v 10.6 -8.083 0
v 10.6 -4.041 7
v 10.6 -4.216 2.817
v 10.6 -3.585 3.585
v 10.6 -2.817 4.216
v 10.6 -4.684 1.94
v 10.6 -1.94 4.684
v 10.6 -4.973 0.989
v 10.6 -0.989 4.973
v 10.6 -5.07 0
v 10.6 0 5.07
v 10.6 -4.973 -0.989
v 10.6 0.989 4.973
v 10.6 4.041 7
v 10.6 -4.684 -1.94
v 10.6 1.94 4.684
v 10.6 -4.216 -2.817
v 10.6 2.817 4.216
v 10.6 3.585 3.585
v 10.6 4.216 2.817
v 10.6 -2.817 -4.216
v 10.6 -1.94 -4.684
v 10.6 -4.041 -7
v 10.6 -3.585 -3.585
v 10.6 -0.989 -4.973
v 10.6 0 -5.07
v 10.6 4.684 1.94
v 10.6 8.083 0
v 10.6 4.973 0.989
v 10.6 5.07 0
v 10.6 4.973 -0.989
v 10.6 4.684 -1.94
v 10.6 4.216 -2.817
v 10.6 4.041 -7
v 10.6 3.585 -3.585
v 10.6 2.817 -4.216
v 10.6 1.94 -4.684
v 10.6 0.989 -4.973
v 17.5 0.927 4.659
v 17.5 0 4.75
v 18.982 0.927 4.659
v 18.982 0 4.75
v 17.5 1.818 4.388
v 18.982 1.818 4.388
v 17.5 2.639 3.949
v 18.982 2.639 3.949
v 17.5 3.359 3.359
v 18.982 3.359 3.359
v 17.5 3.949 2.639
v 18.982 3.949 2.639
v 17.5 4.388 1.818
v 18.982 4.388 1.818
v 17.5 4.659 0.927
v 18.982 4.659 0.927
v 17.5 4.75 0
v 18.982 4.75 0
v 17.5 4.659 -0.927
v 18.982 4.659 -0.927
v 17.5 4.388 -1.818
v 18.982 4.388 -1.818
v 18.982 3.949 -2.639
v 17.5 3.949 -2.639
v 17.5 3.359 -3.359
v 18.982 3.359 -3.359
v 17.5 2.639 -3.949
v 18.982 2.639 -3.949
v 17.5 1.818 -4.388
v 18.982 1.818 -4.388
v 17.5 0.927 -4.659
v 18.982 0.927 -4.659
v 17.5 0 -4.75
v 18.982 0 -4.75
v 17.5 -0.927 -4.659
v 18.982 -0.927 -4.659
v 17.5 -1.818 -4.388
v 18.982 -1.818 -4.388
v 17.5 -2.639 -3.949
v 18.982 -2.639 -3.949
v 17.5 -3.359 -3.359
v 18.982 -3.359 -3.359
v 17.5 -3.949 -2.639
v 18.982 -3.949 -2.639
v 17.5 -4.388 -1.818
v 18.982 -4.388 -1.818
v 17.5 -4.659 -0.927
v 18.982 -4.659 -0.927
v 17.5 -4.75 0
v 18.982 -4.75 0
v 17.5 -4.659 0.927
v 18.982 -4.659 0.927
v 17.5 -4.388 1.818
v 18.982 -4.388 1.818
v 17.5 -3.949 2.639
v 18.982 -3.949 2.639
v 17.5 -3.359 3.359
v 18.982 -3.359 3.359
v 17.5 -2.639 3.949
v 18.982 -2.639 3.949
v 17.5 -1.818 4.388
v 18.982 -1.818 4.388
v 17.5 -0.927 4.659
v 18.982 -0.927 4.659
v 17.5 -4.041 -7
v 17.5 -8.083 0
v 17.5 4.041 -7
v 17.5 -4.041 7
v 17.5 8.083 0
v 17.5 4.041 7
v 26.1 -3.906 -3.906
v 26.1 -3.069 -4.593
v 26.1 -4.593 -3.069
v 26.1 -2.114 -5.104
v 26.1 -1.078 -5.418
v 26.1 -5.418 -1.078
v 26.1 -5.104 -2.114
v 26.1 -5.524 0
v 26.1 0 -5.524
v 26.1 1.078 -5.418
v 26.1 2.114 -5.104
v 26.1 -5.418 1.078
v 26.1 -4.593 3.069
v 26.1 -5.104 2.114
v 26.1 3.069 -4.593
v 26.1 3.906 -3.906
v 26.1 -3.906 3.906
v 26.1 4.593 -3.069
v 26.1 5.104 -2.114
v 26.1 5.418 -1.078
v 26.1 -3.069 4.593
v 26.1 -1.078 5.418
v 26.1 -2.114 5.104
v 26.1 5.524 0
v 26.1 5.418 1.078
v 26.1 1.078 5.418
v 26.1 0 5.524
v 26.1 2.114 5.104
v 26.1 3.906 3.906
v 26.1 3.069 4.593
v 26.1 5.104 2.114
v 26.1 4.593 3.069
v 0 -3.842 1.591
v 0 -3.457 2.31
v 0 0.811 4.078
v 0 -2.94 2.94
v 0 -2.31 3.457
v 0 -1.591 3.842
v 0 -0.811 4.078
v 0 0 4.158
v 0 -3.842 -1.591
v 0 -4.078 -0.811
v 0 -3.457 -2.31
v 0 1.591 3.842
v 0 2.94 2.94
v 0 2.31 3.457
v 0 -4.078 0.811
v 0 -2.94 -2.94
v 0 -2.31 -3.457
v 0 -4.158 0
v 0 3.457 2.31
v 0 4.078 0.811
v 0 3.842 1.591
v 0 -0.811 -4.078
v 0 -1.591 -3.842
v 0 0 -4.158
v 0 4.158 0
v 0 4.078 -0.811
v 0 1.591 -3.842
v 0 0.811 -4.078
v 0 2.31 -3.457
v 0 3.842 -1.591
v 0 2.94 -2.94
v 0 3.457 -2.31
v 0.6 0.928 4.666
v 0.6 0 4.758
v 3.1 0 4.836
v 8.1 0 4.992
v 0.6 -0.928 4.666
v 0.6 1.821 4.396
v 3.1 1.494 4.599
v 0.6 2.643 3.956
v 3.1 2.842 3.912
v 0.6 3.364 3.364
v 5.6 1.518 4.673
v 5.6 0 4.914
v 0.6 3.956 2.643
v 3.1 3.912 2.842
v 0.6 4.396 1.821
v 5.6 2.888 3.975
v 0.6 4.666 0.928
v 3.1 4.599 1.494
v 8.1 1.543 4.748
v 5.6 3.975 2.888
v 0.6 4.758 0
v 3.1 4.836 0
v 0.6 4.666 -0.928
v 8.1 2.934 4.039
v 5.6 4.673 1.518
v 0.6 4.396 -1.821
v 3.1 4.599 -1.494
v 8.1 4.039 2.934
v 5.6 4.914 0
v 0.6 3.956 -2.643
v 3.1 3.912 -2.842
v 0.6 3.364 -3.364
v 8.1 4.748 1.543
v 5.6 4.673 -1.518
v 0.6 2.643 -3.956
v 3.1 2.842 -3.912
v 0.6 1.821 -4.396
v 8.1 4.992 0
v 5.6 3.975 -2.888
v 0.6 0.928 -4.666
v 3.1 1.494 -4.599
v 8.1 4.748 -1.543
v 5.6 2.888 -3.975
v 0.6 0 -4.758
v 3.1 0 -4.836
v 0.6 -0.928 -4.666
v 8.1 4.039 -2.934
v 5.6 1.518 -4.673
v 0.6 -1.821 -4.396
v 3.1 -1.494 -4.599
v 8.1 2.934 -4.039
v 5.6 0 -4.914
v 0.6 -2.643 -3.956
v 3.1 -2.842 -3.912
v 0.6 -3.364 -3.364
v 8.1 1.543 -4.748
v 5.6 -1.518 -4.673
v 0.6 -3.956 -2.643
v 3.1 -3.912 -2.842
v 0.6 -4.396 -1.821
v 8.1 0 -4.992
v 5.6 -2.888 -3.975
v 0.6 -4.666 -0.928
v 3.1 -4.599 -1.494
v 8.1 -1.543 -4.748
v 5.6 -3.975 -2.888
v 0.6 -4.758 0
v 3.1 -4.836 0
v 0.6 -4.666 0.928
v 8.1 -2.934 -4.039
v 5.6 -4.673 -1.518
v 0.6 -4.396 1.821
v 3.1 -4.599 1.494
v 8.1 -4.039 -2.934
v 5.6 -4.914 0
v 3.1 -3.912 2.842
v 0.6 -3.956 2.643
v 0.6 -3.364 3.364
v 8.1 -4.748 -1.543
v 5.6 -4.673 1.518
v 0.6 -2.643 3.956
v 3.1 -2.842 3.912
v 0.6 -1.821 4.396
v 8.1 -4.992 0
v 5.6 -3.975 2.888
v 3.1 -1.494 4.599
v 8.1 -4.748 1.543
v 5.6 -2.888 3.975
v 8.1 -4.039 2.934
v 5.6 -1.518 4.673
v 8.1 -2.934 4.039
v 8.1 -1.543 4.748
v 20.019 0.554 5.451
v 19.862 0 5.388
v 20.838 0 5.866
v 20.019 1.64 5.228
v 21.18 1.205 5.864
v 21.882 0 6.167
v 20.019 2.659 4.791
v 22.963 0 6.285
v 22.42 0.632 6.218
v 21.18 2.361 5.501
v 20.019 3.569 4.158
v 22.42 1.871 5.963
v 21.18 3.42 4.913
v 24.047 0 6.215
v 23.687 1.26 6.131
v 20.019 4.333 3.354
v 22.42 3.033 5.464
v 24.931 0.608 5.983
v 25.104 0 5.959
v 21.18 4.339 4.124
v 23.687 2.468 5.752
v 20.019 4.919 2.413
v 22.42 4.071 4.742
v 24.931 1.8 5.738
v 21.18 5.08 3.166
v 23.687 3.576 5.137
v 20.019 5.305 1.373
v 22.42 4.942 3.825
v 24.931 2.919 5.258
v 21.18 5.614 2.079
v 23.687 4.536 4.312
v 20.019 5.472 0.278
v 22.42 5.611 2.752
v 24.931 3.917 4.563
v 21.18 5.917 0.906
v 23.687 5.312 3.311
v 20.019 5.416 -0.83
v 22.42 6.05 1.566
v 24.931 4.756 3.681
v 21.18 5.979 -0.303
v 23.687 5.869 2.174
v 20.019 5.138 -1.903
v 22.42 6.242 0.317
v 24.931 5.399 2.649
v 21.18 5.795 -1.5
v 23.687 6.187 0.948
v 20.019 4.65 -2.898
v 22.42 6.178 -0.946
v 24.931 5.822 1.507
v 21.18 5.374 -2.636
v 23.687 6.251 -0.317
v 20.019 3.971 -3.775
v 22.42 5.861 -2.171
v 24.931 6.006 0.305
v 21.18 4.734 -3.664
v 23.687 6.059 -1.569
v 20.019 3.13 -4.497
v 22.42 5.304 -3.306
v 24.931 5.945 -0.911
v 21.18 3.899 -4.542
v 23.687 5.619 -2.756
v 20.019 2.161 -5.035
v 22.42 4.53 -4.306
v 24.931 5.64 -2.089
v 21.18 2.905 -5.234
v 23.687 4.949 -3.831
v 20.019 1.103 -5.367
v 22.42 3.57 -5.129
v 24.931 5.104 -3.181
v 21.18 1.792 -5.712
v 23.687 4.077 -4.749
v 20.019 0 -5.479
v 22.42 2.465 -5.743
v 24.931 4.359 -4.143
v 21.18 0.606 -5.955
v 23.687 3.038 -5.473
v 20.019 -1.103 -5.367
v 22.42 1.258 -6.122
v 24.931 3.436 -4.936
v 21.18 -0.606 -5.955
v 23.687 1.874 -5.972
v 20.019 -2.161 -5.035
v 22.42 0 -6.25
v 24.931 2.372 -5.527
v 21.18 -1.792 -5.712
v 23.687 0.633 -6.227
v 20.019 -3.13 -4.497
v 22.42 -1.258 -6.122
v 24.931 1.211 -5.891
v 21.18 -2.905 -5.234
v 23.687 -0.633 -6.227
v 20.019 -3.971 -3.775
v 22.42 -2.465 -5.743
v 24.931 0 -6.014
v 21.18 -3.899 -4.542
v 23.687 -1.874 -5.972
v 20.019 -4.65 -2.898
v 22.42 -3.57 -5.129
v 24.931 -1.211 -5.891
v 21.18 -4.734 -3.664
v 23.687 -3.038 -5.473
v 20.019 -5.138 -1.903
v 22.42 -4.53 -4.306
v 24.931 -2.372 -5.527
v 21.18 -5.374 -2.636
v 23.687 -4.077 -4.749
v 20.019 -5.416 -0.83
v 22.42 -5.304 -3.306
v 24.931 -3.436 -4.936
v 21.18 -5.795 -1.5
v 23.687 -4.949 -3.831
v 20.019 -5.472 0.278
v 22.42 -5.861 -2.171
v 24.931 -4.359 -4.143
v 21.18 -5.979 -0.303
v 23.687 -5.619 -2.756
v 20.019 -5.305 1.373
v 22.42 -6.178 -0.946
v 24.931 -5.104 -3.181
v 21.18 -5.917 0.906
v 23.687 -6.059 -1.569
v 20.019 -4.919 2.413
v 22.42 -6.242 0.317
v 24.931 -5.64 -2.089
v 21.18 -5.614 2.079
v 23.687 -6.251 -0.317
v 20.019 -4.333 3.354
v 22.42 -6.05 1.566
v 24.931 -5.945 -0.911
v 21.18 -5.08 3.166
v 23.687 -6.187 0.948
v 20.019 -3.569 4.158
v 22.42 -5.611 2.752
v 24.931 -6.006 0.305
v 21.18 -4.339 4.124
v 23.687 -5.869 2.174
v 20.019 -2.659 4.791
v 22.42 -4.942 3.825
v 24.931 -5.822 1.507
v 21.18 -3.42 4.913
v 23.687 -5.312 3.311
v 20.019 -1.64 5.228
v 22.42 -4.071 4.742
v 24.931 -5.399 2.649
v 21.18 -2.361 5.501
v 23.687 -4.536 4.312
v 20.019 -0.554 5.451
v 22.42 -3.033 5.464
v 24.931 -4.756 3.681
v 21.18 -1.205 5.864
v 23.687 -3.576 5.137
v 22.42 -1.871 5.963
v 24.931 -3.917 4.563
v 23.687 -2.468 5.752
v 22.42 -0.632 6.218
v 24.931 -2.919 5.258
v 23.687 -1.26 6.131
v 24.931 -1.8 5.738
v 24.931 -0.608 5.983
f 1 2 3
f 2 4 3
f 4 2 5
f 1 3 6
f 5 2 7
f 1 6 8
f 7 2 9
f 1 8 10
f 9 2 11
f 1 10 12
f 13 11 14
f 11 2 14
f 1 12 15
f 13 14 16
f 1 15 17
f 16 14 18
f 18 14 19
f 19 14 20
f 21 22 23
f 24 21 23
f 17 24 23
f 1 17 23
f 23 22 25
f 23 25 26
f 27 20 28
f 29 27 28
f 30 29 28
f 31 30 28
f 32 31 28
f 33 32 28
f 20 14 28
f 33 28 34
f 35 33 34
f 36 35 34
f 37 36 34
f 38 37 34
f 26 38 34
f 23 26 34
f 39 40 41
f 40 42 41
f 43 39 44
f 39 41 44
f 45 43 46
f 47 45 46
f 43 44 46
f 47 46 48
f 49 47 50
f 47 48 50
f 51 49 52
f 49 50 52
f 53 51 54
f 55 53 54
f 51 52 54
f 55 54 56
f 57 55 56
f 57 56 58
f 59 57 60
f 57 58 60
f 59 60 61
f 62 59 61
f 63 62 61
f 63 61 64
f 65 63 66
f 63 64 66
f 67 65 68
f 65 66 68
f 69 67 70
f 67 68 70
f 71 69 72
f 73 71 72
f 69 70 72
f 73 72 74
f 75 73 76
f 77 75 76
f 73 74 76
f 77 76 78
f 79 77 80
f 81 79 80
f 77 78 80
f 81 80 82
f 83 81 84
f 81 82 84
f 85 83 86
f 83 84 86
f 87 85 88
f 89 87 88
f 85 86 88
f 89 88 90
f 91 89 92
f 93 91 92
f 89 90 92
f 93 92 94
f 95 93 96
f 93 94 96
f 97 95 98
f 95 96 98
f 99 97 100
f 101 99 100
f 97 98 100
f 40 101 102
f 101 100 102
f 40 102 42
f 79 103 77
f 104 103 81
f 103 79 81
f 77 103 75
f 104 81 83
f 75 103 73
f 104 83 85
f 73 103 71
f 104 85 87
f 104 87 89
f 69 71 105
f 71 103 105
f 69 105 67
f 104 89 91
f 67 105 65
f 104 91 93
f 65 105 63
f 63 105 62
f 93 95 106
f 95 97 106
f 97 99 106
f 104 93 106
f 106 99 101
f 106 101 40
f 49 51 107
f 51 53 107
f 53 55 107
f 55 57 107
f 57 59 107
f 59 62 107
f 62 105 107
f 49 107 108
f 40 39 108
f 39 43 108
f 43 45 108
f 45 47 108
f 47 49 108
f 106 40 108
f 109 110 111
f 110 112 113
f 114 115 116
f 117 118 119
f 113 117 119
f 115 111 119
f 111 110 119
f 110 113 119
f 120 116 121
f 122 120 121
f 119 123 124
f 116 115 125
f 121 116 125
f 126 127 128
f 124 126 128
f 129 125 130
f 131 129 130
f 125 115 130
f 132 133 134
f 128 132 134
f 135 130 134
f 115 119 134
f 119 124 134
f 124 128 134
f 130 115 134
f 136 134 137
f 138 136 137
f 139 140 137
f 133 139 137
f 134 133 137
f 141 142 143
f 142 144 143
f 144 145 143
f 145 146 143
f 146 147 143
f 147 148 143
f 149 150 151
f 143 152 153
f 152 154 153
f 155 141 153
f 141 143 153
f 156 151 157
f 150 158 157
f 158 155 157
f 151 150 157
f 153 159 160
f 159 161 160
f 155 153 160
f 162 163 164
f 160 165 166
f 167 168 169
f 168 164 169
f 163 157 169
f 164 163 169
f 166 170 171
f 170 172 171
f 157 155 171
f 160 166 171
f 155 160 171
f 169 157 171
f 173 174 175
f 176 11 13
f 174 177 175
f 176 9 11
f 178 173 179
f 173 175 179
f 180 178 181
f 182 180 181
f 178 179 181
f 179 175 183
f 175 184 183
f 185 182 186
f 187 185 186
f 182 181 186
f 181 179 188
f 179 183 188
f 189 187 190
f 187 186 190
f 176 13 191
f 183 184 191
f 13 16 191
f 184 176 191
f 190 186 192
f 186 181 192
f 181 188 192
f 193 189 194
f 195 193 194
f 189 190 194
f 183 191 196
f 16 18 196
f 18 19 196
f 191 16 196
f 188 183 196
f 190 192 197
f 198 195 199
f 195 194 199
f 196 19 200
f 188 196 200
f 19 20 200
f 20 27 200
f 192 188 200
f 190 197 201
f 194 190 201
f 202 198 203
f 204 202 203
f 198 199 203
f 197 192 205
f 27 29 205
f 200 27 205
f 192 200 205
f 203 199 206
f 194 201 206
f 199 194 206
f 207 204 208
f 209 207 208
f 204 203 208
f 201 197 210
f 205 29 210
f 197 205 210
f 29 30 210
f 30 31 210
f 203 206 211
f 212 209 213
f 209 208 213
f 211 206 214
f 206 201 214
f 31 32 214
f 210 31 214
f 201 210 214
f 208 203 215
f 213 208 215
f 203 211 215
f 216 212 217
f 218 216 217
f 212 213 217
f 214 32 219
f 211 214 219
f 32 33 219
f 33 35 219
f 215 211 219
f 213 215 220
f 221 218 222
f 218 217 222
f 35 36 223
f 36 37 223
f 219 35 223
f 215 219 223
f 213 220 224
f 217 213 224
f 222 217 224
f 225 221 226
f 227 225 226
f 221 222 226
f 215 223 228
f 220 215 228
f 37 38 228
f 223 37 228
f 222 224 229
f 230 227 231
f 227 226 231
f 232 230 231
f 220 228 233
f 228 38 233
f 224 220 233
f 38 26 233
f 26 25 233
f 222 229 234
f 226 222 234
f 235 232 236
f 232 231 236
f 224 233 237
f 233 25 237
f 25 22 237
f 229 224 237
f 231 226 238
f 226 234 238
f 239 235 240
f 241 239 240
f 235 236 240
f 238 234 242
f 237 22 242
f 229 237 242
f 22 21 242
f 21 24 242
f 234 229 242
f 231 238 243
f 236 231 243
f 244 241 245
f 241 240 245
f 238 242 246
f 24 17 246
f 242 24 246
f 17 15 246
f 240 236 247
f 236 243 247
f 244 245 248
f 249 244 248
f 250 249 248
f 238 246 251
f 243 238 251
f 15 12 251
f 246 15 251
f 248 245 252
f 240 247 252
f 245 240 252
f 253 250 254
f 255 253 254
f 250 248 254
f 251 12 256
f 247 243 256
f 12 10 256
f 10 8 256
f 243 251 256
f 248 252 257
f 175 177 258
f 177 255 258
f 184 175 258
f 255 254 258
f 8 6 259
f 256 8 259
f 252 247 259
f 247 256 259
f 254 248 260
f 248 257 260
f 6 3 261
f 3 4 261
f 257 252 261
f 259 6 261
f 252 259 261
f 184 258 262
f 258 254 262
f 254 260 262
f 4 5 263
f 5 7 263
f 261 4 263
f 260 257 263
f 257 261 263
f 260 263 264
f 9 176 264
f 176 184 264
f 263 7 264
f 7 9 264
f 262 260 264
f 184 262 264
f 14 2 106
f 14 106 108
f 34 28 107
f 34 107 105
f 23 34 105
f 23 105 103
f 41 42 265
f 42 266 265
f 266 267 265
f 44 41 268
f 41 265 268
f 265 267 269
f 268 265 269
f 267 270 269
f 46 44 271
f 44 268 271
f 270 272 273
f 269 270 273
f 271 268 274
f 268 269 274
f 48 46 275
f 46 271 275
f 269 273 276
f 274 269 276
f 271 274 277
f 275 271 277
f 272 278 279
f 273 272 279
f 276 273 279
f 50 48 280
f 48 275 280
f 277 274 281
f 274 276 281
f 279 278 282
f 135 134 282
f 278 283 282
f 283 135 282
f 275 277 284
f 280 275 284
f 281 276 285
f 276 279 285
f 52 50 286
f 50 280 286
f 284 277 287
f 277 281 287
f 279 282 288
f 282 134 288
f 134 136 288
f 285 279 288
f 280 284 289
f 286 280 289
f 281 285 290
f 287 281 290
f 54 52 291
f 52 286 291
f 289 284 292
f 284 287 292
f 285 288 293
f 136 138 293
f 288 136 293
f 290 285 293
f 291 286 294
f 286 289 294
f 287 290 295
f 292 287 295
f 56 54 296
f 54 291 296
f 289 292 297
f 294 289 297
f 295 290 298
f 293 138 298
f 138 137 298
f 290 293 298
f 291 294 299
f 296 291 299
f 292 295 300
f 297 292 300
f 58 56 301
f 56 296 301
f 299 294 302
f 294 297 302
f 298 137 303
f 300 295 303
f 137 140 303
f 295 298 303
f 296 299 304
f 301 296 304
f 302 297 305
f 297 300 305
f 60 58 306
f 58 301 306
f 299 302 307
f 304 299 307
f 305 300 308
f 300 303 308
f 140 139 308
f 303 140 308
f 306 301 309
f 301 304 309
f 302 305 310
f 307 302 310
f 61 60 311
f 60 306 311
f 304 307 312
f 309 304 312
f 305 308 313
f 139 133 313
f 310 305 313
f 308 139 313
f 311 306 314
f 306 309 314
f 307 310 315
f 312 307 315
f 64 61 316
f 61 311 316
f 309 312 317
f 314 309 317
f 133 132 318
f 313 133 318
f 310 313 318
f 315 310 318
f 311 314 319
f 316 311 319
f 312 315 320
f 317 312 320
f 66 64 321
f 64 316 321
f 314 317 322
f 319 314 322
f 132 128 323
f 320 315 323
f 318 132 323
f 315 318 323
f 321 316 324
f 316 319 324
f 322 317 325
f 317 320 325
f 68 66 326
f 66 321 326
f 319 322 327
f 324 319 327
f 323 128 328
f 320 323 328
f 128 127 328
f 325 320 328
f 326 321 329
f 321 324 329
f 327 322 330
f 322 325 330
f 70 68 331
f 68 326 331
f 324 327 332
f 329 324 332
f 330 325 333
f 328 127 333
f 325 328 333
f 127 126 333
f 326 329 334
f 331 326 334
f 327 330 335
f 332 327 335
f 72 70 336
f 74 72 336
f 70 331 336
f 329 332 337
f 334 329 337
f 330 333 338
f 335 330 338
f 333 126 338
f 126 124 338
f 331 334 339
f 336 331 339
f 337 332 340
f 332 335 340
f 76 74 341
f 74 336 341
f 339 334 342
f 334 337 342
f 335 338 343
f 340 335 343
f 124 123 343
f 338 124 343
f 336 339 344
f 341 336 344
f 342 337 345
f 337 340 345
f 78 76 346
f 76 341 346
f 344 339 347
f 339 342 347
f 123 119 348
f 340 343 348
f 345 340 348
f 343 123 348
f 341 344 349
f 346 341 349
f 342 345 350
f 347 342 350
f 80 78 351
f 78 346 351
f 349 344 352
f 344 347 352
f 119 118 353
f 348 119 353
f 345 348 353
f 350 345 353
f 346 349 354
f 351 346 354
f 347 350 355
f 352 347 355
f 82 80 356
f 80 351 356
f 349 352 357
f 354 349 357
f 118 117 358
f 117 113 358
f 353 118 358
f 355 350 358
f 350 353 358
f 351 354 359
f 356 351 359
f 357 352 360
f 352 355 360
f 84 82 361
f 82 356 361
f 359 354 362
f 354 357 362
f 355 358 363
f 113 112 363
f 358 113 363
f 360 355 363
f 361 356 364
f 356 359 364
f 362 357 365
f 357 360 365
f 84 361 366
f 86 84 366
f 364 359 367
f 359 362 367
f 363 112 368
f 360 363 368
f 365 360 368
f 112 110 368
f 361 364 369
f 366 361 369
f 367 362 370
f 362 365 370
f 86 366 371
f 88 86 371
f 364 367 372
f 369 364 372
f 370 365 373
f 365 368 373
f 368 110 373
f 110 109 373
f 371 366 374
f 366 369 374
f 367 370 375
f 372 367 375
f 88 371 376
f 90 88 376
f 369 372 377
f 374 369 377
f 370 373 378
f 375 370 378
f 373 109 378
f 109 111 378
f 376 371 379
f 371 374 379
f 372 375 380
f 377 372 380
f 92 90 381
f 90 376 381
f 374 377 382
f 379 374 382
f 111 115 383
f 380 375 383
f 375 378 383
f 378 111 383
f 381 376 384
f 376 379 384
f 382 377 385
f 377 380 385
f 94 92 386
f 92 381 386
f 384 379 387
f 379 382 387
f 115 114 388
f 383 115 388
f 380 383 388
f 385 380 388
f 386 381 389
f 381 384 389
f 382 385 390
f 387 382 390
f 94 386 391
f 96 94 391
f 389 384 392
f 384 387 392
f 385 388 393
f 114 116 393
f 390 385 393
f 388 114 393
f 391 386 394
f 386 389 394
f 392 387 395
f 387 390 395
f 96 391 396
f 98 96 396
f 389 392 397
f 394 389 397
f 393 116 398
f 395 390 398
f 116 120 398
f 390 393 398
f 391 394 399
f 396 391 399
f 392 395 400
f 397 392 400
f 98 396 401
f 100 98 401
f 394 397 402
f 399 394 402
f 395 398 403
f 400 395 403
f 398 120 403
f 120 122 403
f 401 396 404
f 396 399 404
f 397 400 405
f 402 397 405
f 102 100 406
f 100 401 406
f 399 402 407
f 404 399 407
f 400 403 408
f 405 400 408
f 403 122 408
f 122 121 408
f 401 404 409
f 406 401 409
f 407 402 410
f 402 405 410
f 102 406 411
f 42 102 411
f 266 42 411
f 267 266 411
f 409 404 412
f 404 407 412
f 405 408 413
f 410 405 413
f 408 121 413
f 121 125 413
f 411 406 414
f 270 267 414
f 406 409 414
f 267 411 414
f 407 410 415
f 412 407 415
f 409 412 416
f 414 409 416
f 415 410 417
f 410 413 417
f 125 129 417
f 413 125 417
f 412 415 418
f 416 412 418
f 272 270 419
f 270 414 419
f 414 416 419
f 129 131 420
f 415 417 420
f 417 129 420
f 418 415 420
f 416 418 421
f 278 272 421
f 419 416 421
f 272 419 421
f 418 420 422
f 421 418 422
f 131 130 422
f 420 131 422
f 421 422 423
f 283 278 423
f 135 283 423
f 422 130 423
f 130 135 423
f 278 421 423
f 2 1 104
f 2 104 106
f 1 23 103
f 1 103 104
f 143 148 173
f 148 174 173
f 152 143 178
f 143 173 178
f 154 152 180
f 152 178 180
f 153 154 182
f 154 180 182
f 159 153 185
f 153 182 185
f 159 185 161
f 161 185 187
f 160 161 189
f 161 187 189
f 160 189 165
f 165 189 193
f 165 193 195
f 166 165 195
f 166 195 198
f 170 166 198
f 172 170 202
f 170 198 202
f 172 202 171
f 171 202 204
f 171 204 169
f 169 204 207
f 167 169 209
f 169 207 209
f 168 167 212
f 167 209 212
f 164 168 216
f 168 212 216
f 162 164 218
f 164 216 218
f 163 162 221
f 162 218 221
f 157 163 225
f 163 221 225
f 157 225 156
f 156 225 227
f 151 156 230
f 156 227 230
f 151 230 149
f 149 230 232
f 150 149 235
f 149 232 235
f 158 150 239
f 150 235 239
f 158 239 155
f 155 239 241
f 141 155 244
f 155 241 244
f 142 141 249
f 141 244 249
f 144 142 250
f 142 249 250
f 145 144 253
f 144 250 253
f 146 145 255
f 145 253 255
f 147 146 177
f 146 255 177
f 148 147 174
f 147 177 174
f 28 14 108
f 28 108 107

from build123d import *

# Parameters (mm, degrees)
SKETCH_2_R          = 14
CUT_EXTRUDE_1_DEPTH = 6.9


with BuildPart() as part:
    # 草图1 → 旋转1 (revolve)
    with BuildSketch(Plane.XY):
        with BuildLine():
            Line((0, 0), (0, 4.158121832))
            Line((0, 4.158121832), (0.59972308, 4.757844912))
            Line((0.59972308, 4.757844912), (10.6, 5.070048976))
            Line((10.6, 5.070048976), (10.6, 12))
            Line((10.6, 12), (17.5, 12))
            Line((17.5, 12), (17.5, 4.75))
            Line((17.5, 4.75), (18.982041495, 4.75))
            ThreePointArc((18.982041495, 4.75), (22.419985488, 6.249612989), (26.1, 5.524498371))
            Line((26.1, 5.524498371), (26.1, 0))
            Line((26.1, 0), (0, 0))
        make_face()
    revolve(axis=Axis((26.1, 0, 0), (-1, 0, 0)))

    # 草图2 → 切除-拉伸1 (cut)
    with BuildSketch(Plane.ZY.offset(-10.6)):
        Circle(SKETCH_2_R)
        Polygon((0, -8.082903769), (7, -4.041451884), (7, 4.041451884), (0, 8.082903769), (-7, 4.041451884), (-7, -4.041451884), align=None, mode=Mode.SUBTRACT)
    extrude(amount=-CUT_EXTRUDE_1_DEPTH, mode=Mode.SUBTRACT)


solid = part.part
